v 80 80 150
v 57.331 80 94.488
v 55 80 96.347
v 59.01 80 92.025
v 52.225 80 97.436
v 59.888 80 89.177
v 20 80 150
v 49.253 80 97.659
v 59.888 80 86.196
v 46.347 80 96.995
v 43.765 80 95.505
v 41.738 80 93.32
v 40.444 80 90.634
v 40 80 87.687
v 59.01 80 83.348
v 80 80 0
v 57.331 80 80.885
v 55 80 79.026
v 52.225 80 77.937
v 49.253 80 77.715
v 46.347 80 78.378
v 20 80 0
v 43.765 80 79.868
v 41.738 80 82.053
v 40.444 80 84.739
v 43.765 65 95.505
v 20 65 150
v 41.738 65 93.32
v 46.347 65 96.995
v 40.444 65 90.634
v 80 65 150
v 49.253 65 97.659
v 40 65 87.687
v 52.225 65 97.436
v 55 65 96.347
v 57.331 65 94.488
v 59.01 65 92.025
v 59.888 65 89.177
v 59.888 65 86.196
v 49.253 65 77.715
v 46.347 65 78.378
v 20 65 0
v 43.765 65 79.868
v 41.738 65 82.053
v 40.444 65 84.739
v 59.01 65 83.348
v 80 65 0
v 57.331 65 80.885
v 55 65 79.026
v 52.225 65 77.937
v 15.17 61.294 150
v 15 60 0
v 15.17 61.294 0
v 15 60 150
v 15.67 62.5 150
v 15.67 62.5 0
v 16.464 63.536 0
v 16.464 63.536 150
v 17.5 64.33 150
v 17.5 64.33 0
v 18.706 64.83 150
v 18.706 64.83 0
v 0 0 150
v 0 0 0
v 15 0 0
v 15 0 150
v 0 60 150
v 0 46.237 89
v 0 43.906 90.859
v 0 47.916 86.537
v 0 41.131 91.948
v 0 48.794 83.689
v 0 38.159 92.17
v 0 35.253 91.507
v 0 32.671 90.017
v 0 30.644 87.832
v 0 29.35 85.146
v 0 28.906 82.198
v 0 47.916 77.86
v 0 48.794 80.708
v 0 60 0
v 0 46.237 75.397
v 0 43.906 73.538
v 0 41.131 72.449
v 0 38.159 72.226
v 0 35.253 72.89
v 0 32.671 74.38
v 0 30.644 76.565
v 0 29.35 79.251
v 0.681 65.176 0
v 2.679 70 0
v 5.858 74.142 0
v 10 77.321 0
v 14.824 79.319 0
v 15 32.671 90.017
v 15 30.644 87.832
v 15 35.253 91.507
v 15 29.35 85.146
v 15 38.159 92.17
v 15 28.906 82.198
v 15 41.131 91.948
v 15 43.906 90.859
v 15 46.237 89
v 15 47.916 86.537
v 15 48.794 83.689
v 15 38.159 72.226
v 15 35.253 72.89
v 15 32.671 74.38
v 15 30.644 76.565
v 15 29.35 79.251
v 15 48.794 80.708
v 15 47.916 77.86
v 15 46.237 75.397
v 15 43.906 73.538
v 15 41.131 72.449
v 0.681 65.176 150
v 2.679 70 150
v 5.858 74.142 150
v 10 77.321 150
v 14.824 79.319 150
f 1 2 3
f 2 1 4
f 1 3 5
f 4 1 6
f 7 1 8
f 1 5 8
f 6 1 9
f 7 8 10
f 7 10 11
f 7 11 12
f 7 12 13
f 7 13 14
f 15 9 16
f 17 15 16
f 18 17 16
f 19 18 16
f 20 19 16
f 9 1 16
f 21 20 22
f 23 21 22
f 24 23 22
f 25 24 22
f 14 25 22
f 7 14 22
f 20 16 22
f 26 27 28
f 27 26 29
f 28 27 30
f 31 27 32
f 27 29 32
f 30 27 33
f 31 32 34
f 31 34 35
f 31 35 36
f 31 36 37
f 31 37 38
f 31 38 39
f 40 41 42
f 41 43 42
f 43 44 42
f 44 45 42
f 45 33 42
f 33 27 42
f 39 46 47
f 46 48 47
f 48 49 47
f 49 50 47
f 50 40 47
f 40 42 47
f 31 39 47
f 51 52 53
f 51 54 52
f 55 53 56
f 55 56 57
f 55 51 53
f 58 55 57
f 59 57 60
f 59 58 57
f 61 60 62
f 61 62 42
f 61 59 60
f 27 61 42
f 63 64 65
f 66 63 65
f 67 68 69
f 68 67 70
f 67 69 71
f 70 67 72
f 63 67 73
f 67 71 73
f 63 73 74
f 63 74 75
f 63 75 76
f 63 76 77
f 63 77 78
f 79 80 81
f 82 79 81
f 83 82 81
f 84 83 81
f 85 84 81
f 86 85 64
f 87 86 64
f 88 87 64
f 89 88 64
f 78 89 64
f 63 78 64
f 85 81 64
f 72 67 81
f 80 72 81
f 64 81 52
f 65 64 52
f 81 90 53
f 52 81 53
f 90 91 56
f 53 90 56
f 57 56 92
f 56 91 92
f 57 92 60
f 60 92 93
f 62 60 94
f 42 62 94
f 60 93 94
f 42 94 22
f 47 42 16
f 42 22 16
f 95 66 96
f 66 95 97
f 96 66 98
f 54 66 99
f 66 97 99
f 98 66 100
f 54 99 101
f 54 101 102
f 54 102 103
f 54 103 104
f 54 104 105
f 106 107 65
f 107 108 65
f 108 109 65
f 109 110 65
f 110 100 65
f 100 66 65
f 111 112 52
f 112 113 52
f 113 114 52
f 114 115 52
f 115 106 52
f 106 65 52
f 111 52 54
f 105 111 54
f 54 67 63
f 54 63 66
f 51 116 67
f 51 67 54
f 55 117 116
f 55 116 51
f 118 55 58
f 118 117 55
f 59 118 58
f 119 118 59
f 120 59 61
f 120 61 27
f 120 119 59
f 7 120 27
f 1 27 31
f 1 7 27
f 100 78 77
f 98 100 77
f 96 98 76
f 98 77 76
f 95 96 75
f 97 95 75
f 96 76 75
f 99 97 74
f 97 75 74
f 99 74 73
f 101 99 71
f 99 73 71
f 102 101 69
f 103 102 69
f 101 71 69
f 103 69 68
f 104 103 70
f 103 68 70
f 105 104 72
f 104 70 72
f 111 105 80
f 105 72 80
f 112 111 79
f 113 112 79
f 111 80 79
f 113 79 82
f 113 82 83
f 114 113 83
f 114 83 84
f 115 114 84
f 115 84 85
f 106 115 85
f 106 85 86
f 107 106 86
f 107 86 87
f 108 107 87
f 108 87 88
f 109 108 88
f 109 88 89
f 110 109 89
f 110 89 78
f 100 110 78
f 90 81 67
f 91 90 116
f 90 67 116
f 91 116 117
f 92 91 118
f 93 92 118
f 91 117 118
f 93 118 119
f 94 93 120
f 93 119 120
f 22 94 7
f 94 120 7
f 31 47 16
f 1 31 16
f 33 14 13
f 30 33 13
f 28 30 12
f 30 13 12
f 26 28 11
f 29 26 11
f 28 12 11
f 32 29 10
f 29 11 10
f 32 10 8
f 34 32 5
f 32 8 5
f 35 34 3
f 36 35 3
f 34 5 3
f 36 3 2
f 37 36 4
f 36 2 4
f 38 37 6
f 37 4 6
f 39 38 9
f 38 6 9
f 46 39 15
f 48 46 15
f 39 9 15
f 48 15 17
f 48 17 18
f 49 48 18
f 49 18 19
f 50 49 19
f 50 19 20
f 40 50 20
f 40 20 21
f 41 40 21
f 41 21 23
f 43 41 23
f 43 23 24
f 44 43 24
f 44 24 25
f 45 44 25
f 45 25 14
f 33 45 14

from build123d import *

# Parameters (mm, degrees)
F1_DEPTH = 150
F2_R     = 20
F3_R     = 5
F4_R     = 10
F5_DEPTH = 80.001
F6_R     = 10
F7_DEPTH = 80.001


with BuildPart() as f1:
    # F0 (on Top) → F1 (new body)
    with BuildSketch(Plane.XY):
        Polygon((0, 80), (0, 0), (15, 0), (15, 65), (80, 65), (80, 80), align=None)
    extrude(amount=F1_DEPTH)

    # F2
    f2_edges = [f1.edges().sort_by_distance(p)[0] for p in [
        (0, 80, 75),
    ]]
    fillet(f2_edges, radius=F2_R)

    # F3
    f3_edges = [f1.edges().sort_by_distance(p)[0] for p in [
        (15, 65, 75),
    ]]
    fillet(f3_edges, radius=F3_R)

    # F4 (on face) → F5 (cut, through all)
    with BuildSketch(Plane(origin=(0, 0, 0), x_dir=(0, -1, 0), z_dir=(-1, 0, 0))):
        with Locations((-38.906008, 82.198426)):
            Circle(F4_R)
    extrude(amount=-F5_DEPTH, mode=Mode.SUBTRACT)

    # F6 (on face) → F7 (cut, through all)
    with BuildSketch(Plane(origin=(0, 80, 0), x_dir=(-1, 0, 0), z_dir=(0, 1, 0))):
        with Locations((-50, 87.686576)):
            Circle(F6_R)
    extrude(amount=-F7_DEPTH, mode=Mode.SUBTRACT)


solid = f1.part
